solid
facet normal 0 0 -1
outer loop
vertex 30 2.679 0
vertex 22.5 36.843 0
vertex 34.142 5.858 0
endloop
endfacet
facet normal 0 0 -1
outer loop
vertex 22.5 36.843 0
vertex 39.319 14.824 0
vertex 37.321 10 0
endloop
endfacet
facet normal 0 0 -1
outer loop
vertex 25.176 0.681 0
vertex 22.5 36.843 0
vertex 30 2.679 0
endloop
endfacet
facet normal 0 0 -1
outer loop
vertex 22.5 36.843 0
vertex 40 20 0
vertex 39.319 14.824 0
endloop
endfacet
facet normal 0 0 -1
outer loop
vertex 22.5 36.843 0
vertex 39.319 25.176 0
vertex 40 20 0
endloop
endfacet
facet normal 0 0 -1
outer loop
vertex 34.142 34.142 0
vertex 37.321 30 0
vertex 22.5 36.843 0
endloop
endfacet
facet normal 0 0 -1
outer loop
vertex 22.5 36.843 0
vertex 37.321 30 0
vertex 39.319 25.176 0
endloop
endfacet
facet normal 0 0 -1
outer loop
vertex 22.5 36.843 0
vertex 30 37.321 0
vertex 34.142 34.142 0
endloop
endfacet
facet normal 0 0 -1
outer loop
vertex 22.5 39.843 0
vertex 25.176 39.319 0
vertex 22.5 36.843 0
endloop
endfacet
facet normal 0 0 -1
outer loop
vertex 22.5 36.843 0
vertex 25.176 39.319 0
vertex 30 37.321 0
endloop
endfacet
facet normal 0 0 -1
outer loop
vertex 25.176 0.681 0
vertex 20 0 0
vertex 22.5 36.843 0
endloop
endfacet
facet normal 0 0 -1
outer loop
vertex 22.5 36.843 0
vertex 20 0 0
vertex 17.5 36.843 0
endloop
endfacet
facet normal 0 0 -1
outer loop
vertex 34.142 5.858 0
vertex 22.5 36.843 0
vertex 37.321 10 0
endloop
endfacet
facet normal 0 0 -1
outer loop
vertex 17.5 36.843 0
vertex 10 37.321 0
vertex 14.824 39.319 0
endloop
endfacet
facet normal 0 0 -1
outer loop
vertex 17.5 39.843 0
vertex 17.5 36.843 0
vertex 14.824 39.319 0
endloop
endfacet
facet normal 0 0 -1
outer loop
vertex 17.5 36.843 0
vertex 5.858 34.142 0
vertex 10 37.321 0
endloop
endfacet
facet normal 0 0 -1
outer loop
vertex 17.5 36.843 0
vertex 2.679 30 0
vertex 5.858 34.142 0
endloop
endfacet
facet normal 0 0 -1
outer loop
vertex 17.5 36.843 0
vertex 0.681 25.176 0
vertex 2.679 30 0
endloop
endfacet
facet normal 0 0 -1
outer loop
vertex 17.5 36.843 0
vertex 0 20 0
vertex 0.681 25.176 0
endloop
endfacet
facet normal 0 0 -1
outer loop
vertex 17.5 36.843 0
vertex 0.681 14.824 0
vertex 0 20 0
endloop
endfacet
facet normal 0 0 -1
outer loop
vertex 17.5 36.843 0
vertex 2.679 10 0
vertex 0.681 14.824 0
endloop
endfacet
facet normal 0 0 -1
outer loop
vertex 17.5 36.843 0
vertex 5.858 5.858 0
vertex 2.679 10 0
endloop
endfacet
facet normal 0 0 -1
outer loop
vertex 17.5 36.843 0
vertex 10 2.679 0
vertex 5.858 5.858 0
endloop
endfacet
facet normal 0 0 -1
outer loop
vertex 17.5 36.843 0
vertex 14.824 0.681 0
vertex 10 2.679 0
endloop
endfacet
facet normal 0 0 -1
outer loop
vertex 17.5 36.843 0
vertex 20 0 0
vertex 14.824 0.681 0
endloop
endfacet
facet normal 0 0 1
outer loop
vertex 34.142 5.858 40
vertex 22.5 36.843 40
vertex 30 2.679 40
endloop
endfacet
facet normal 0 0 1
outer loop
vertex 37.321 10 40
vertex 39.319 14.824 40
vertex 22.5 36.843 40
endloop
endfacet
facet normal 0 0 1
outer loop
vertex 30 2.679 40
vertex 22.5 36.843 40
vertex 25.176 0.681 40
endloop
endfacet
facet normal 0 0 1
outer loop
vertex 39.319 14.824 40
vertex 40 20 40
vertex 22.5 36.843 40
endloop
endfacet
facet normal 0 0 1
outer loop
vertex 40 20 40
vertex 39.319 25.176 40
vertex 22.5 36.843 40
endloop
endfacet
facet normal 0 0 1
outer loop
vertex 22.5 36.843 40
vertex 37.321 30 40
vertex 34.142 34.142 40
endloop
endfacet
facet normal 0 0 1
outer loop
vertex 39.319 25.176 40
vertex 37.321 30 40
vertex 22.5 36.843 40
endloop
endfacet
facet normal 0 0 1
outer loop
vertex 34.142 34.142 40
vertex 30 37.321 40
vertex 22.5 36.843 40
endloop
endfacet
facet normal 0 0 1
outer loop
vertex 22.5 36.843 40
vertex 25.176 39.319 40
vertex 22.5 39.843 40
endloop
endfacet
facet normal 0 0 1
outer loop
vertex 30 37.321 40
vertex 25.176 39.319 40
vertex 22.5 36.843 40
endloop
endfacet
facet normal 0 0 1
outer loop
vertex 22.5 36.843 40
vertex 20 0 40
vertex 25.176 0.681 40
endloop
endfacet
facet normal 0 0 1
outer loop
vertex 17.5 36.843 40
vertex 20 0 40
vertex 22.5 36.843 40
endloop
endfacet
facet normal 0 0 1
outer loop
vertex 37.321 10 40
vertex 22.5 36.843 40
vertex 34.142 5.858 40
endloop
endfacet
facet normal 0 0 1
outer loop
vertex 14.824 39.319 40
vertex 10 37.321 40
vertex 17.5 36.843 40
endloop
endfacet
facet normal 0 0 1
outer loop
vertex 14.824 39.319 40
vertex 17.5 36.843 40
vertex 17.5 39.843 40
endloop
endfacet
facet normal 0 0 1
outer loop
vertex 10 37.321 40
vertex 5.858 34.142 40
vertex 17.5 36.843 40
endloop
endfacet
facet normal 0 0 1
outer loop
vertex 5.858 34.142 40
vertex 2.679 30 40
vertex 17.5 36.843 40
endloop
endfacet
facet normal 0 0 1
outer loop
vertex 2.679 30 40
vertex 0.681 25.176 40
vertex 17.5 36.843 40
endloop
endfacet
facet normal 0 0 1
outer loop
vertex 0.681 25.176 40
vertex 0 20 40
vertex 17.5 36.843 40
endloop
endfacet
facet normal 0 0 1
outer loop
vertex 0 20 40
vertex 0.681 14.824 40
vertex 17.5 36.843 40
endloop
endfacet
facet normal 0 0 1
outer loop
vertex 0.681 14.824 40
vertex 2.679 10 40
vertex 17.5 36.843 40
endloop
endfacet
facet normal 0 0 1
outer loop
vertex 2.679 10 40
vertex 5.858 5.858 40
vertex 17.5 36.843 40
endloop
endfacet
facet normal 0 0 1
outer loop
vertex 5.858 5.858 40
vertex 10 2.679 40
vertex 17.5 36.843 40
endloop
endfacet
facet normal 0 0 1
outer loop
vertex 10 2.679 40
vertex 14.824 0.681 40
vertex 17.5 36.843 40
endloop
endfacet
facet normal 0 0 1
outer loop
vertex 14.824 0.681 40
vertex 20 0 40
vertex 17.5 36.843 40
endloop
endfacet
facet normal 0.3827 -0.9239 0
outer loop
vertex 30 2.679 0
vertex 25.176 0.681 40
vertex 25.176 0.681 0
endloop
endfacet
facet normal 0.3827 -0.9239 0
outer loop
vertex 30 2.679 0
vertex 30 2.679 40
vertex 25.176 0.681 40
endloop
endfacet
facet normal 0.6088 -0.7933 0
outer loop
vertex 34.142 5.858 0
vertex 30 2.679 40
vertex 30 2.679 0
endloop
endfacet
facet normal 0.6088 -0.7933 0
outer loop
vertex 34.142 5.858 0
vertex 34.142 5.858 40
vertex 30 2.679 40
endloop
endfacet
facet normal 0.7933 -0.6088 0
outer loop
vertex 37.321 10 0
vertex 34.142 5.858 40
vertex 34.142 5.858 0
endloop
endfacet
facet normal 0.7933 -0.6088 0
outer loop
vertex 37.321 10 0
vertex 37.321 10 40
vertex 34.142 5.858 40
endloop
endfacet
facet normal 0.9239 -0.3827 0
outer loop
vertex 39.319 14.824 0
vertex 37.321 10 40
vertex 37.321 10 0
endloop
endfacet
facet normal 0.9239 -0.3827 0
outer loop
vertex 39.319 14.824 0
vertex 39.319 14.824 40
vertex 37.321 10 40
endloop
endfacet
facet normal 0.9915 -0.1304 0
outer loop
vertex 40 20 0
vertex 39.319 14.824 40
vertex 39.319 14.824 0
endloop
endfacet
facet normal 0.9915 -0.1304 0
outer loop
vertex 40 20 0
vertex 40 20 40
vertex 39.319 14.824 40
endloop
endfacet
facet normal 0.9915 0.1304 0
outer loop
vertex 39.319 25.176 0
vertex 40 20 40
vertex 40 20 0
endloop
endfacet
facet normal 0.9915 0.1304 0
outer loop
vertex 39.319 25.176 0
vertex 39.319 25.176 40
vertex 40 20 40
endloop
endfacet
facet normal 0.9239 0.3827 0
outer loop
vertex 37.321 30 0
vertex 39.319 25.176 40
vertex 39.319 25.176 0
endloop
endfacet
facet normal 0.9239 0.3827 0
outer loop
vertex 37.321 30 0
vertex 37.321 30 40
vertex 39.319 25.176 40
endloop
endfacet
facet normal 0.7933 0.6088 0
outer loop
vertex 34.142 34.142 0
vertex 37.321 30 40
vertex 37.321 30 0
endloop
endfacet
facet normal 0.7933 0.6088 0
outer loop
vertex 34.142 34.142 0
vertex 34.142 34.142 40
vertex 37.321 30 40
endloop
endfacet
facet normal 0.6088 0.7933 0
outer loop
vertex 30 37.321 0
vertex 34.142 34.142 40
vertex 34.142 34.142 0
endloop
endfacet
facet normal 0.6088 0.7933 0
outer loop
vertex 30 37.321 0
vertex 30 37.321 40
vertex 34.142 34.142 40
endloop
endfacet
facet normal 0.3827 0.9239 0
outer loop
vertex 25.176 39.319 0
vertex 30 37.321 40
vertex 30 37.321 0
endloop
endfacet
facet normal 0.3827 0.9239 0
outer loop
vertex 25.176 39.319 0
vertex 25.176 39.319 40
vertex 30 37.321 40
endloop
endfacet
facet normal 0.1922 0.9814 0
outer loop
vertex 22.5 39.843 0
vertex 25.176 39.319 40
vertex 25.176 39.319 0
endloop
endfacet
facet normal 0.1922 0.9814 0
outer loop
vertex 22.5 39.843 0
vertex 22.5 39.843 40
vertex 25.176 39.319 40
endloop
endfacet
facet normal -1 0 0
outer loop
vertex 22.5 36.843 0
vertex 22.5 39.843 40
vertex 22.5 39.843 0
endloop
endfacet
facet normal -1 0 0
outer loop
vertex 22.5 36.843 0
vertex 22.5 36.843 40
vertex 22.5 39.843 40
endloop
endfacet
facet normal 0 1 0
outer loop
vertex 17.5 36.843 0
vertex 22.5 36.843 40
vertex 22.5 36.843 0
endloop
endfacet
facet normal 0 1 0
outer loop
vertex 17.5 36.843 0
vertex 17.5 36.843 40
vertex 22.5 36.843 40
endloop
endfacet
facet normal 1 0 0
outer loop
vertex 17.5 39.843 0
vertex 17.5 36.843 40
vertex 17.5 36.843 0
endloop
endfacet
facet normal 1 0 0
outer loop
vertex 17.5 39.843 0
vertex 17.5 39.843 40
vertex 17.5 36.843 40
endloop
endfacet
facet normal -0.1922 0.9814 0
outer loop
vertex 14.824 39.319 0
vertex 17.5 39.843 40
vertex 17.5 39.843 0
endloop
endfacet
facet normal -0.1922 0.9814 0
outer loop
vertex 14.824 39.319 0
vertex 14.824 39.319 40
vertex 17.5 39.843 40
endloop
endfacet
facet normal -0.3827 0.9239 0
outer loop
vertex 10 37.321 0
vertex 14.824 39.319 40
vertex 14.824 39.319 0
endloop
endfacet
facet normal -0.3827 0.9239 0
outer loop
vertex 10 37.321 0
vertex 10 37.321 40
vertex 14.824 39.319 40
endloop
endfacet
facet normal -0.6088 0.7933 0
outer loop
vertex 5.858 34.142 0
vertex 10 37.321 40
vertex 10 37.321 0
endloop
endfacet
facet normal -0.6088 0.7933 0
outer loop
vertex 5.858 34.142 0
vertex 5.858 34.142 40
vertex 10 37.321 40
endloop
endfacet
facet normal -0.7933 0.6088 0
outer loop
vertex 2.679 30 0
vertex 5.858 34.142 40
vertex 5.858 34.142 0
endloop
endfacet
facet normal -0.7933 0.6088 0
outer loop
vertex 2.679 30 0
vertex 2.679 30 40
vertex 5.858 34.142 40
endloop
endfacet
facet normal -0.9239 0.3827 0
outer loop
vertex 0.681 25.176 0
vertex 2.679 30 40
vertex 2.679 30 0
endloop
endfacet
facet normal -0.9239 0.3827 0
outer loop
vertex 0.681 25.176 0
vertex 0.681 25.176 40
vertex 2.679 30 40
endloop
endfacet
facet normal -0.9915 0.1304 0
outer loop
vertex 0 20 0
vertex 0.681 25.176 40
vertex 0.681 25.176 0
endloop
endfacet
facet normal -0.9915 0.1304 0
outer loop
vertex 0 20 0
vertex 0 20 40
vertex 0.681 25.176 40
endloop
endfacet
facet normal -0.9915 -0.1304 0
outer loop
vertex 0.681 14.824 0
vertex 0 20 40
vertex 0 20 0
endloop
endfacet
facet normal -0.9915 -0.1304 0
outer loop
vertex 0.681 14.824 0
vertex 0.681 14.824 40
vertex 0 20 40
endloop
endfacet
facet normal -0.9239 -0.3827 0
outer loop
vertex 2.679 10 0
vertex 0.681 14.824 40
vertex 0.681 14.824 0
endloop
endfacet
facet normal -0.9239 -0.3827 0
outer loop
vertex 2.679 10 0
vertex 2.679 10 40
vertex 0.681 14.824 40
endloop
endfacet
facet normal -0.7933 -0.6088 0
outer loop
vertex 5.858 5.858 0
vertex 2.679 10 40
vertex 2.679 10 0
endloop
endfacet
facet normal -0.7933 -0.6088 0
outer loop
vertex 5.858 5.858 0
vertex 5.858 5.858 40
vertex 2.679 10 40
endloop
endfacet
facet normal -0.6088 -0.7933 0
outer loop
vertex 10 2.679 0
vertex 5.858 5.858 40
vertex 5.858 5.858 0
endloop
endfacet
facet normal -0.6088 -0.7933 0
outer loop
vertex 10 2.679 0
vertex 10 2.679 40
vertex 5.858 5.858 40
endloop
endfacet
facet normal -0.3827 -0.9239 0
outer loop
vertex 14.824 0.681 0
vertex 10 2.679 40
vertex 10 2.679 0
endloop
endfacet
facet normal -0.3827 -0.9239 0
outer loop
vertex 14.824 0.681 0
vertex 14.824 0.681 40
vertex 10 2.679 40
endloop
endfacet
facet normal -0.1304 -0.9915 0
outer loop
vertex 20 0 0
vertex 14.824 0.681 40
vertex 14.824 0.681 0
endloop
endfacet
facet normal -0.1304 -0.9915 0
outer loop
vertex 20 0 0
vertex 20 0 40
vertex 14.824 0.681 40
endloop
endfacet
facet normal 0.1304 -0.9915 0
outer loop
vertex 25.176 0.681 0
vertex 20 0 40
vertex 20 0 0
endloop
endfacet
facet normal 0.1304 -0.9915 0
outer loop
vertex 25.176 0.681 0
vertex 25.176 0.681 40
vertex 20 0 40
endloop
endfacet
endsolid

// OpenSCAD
$fn = 32;

// ----------------------------------------------------------------------
// Keyway shaft: d40 shaft, key 5 x 3 mm
// ----------------------------------------------------------------------

// --- parameters (mm) ---
shaft_r = 20;             // shaft radius
key_w = 5;                // keyway width
key_d = 3;                // keyway depth below the surface line
plate_t = 40;             // shaft length, Z (extrusion height)

shaft_d = 2 * shaft_r;  // shaft diameter
circle_step = 15;  // polygon sampling step, degrees

profile = [[14.824, 39.319], [10, 37.321], [5.858, 34.142], [2.679, 30], [0.681, 25.176], [0, 20], [0.681, 14.824], [2.679, 10], [5.858, 5.858], [10, 2.679], [14.824, 0.681], [20, 0], [25.176, 0.681], [30, 2.679], [34.142, 5.858], [37.321, 10], [39.319, 14.824], [40, 20], [39.319, 25.176], [37.321, 30], [34.142, 34.142], [30, 37.321], [25.176, 39.319], [22.5, 39.843], [22.5, 36.843], [17.5, 36.843], [17.5, 39.843]];  // primary outline, 27 points, counter clockwise

// --- the one profile operation ---
linear_extrude(height = plate_t) polygon(points = profile);
